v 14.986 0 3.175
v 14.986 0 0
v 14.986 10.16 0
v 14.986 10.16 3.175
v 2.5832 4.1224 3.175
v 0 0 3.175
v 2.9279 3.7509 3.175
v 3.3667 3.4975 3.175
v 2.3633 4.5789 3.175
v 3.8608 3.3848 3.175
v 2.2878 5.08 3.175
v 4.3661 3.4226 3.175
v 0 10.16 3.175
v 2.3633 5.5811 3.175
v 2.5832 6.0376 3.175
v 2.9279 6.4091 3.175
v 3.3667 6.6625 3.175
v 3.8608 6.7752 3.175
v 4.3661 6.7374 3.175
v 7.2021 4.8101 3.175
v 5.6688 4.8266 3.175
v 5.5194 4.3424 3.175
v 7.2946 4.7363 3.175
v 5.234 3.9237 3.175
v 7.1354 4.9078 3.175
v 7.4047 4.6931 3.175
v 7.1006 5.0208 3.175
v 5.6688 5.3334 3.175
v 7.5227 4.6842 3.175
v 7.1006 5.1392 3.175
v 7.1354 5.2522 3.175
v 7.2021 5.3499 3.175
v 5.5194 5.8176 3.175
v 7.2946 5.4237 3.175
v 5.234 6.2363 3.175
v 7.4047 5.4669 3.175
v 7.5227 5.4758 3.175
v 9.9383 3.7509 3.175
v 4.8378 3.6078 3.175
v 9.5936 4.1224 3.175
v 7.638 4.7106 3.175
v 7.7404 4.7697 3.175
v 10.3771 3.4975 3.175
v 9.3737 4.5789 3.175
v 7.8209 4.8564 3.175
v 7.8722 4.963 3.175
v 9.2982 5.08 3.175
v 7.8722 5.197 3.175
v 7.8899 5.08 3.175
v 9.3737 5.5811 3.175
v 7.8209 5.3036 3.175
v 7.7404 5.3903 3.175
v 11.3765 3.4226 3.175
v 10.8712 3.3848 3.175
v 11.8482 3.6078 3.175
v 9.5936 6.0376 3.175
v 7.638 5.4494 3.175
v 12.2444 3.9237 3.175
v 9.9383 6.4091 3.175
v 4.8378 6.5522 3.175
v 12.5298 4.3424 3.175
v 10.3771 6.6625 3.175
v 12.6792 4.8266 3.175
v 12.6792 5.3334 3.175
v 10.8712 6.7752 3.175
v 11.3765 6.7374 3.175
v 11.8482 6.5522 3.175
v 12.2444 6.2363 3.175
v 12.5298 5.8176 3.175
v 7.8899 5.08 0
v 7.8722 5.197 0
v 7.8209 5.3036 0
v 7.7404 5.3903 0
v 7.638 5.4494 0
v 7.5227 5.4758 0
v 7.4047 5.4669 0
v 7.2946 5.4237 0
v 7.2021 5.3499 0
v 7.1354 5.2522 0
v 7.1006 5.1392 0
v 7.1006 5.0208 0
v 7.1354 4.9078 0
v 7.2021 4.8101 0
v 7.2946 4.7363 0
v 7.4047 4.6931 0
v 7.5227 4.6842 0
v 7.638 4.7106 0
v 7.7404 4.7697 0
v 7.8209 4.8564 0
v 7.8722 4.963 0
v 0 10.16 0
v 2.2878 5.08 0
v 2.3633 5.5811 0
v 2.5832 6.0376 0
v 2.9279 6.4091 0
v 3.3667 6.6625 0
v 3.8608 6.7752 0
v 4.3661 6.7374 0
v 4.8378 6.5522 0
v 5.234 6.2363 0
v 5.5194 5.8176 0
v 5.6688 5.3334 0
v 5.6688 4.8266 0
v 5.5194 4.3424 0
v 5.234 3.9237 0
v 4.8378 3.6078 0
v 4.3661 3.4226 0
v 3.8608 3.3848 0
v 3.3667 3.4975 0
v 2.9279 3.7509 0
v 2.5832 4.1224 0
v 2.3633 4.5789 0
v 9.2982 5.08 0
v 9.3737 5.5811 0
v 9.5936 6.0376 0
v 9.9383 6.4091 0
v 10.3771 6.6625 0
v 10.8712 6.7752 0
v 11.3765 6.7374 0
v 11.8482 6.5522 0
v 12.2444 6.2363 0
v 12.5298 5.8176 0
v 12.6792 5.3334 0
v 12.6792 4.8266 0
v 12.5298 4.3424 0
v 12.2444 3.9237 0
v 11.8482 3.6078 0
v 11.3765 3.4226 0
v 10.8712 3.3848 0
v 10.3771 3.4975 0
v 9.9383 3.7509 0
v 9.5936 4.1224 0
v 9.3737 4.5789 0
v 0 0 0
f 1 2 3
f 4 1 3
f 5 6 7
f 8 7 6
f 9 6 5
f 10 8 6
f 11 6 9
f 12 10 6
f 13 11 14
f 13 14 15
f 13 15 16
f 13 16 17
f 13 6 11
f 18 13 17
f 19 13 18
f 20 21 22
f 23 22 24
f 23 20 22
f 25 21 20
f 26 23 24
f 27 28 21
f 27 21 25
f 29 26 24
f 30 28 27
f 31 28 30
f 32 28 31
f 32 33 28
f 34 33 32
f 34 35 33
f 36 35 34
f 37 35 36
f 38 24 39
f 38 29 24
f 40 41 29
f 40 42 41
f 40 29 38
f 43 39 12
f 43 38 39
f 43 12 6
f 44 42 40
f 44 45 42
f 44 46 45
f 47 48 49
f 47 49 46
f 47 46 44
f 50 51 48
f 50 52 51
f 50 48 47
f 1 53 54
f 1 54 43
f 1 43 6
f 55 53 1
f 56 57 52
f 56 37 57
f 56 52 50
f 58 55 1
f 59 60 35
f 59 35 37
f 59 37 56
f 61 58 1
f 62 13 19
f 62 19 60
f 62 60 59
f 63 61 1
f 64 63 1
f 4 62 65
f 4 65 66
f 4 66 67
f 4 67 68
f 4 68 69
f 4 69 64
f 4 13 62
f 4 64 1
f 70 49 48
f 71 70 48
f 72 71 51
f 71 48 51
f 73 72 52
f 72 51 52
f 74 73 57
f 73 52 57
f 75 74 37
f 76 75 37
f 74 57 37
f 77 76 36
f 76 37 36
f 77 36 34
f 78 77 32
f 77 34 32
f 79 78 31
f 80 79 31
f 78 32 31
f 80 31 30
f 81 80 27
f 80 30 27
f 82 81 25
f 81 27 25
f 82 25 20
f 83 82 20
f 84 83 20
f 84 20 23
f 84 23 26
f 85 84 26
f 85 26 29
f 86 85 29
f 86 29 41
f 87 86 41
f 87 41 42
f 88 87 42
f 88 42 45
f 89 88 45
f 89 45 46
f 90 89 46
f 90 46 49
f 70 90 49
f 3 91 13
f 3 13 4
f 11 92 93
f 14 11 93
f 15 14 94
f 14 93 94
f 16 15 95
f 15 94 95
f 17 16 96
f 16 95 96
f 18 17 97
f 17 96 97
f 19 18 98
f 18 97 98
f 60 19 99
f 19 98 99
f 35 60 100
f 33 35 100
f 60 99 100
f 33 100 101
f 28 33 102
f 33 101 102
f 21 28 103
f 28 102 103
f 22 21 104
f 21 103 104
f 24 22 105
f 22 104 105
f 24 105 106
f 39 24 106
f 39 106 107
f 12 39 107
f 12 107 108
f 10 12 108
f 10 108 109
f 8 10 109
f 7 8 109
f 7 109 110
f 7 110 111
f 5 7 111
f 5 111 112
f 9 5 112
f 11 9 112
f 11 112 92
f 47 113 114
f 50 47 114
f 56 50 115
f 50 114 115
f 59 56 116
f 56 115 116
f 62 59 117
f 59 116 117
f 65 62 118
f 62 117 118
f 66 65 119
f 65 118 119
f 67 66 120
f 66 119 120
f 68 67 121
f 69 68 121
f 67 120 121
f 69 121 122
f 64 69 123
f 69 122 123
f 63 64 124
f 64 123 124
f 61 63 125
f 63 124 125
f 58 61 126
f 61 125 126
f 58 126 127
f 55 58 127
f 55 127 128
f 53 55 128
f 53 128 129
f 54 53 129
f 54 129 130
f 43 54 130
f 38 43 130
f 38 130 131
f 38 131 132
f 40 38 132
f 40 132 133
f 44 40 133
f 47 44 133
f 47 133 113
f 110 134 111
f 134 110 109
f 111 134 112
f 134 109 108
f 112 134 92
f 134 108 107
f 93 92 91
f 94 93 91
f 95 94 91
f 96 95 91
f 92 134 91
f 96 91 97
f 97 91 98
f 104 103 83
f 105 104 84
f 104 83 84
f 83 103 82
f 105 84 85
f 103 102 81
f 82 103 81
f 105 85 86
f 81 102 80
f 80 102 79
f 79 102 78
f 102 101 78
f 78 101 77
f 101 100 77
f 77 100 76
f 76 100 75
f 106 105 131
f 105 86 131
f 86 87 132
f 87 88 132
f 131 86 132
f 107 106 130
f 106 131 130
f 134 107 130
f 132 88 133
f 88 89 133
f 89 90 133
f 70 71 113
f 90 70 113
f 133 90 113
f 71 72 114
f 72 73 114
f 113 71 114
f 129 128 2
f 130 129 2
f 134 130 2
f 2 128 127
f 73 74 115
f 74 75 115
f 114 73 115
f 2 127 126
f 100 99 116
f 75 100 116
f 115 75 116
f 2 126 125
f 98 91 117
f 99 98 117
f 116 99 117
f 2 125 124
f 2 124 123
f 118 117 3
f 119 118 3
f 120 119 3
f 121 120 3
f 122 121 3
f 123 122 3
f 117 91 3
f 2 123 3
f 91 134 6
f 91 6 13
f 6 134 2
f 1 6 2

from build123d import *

# Parameters (mm, degrees)
SKETCH1_W                = 14.986
SKETCH1_H                = 10.16
BOSS_EXTRUDE1_DEPTH      = 3.175
M3_CLEARANCE_HOLE1_D     = 3.4
M3_CLEARANCE_HOLE1_DEPTH = 10
M3_CLEARANCE_HOLE1_TIP   = 1.021463052
SKETCH4_R                = 0.396875
CUT_EXTRUDE1_DEPTH       = 19.38168711


with BuildPart() as part:
    # Sketch1 → Boss-Extrude1 (new body)
    with BuildSketch(Plane.XY):
        with Locations((7.493, 5.08)):
            Rectangle(SKETCH1_W, SKETCH1_H)
    extrude(amount=BOSS_EXTRUDE1_DEPTH)

    # M3 Clearance Hole1
    with Locations(Plane.XY.offset(3.175)):
        with Locations((10.9982, 5.08), (3.9878, 5.08)):
            Hole(M3_CLEARANCE_HOLE1_D / 2, depth=M3_CLEARANCE_HOLE1_DEPTH)
            with Locations((0, 0, -(M3_CLEARANCE_HOLE1_DEPTH + M3_CLEARANCE_HOLE1_TIP / 2))):  # 118° drill point
                Cone(0, M3_CLEARANCE_HOLE1_D / 2, M3_CLEARANCE_HOLE1_TIP, mode=Mode.SUBTRACT)

    # Sketch4 → Cut-Extrude1 (cut, through all)
    with BuildSketch(Plane.XY.offset(3.175)):
        with Locations((7.493, 5.08)):
            Circle(SKETCH4_R)
    extrude(amount=-CUT_EXTRUDE1_DEPTH, mode=Mode.SUBTRACT)


solid = part.part
